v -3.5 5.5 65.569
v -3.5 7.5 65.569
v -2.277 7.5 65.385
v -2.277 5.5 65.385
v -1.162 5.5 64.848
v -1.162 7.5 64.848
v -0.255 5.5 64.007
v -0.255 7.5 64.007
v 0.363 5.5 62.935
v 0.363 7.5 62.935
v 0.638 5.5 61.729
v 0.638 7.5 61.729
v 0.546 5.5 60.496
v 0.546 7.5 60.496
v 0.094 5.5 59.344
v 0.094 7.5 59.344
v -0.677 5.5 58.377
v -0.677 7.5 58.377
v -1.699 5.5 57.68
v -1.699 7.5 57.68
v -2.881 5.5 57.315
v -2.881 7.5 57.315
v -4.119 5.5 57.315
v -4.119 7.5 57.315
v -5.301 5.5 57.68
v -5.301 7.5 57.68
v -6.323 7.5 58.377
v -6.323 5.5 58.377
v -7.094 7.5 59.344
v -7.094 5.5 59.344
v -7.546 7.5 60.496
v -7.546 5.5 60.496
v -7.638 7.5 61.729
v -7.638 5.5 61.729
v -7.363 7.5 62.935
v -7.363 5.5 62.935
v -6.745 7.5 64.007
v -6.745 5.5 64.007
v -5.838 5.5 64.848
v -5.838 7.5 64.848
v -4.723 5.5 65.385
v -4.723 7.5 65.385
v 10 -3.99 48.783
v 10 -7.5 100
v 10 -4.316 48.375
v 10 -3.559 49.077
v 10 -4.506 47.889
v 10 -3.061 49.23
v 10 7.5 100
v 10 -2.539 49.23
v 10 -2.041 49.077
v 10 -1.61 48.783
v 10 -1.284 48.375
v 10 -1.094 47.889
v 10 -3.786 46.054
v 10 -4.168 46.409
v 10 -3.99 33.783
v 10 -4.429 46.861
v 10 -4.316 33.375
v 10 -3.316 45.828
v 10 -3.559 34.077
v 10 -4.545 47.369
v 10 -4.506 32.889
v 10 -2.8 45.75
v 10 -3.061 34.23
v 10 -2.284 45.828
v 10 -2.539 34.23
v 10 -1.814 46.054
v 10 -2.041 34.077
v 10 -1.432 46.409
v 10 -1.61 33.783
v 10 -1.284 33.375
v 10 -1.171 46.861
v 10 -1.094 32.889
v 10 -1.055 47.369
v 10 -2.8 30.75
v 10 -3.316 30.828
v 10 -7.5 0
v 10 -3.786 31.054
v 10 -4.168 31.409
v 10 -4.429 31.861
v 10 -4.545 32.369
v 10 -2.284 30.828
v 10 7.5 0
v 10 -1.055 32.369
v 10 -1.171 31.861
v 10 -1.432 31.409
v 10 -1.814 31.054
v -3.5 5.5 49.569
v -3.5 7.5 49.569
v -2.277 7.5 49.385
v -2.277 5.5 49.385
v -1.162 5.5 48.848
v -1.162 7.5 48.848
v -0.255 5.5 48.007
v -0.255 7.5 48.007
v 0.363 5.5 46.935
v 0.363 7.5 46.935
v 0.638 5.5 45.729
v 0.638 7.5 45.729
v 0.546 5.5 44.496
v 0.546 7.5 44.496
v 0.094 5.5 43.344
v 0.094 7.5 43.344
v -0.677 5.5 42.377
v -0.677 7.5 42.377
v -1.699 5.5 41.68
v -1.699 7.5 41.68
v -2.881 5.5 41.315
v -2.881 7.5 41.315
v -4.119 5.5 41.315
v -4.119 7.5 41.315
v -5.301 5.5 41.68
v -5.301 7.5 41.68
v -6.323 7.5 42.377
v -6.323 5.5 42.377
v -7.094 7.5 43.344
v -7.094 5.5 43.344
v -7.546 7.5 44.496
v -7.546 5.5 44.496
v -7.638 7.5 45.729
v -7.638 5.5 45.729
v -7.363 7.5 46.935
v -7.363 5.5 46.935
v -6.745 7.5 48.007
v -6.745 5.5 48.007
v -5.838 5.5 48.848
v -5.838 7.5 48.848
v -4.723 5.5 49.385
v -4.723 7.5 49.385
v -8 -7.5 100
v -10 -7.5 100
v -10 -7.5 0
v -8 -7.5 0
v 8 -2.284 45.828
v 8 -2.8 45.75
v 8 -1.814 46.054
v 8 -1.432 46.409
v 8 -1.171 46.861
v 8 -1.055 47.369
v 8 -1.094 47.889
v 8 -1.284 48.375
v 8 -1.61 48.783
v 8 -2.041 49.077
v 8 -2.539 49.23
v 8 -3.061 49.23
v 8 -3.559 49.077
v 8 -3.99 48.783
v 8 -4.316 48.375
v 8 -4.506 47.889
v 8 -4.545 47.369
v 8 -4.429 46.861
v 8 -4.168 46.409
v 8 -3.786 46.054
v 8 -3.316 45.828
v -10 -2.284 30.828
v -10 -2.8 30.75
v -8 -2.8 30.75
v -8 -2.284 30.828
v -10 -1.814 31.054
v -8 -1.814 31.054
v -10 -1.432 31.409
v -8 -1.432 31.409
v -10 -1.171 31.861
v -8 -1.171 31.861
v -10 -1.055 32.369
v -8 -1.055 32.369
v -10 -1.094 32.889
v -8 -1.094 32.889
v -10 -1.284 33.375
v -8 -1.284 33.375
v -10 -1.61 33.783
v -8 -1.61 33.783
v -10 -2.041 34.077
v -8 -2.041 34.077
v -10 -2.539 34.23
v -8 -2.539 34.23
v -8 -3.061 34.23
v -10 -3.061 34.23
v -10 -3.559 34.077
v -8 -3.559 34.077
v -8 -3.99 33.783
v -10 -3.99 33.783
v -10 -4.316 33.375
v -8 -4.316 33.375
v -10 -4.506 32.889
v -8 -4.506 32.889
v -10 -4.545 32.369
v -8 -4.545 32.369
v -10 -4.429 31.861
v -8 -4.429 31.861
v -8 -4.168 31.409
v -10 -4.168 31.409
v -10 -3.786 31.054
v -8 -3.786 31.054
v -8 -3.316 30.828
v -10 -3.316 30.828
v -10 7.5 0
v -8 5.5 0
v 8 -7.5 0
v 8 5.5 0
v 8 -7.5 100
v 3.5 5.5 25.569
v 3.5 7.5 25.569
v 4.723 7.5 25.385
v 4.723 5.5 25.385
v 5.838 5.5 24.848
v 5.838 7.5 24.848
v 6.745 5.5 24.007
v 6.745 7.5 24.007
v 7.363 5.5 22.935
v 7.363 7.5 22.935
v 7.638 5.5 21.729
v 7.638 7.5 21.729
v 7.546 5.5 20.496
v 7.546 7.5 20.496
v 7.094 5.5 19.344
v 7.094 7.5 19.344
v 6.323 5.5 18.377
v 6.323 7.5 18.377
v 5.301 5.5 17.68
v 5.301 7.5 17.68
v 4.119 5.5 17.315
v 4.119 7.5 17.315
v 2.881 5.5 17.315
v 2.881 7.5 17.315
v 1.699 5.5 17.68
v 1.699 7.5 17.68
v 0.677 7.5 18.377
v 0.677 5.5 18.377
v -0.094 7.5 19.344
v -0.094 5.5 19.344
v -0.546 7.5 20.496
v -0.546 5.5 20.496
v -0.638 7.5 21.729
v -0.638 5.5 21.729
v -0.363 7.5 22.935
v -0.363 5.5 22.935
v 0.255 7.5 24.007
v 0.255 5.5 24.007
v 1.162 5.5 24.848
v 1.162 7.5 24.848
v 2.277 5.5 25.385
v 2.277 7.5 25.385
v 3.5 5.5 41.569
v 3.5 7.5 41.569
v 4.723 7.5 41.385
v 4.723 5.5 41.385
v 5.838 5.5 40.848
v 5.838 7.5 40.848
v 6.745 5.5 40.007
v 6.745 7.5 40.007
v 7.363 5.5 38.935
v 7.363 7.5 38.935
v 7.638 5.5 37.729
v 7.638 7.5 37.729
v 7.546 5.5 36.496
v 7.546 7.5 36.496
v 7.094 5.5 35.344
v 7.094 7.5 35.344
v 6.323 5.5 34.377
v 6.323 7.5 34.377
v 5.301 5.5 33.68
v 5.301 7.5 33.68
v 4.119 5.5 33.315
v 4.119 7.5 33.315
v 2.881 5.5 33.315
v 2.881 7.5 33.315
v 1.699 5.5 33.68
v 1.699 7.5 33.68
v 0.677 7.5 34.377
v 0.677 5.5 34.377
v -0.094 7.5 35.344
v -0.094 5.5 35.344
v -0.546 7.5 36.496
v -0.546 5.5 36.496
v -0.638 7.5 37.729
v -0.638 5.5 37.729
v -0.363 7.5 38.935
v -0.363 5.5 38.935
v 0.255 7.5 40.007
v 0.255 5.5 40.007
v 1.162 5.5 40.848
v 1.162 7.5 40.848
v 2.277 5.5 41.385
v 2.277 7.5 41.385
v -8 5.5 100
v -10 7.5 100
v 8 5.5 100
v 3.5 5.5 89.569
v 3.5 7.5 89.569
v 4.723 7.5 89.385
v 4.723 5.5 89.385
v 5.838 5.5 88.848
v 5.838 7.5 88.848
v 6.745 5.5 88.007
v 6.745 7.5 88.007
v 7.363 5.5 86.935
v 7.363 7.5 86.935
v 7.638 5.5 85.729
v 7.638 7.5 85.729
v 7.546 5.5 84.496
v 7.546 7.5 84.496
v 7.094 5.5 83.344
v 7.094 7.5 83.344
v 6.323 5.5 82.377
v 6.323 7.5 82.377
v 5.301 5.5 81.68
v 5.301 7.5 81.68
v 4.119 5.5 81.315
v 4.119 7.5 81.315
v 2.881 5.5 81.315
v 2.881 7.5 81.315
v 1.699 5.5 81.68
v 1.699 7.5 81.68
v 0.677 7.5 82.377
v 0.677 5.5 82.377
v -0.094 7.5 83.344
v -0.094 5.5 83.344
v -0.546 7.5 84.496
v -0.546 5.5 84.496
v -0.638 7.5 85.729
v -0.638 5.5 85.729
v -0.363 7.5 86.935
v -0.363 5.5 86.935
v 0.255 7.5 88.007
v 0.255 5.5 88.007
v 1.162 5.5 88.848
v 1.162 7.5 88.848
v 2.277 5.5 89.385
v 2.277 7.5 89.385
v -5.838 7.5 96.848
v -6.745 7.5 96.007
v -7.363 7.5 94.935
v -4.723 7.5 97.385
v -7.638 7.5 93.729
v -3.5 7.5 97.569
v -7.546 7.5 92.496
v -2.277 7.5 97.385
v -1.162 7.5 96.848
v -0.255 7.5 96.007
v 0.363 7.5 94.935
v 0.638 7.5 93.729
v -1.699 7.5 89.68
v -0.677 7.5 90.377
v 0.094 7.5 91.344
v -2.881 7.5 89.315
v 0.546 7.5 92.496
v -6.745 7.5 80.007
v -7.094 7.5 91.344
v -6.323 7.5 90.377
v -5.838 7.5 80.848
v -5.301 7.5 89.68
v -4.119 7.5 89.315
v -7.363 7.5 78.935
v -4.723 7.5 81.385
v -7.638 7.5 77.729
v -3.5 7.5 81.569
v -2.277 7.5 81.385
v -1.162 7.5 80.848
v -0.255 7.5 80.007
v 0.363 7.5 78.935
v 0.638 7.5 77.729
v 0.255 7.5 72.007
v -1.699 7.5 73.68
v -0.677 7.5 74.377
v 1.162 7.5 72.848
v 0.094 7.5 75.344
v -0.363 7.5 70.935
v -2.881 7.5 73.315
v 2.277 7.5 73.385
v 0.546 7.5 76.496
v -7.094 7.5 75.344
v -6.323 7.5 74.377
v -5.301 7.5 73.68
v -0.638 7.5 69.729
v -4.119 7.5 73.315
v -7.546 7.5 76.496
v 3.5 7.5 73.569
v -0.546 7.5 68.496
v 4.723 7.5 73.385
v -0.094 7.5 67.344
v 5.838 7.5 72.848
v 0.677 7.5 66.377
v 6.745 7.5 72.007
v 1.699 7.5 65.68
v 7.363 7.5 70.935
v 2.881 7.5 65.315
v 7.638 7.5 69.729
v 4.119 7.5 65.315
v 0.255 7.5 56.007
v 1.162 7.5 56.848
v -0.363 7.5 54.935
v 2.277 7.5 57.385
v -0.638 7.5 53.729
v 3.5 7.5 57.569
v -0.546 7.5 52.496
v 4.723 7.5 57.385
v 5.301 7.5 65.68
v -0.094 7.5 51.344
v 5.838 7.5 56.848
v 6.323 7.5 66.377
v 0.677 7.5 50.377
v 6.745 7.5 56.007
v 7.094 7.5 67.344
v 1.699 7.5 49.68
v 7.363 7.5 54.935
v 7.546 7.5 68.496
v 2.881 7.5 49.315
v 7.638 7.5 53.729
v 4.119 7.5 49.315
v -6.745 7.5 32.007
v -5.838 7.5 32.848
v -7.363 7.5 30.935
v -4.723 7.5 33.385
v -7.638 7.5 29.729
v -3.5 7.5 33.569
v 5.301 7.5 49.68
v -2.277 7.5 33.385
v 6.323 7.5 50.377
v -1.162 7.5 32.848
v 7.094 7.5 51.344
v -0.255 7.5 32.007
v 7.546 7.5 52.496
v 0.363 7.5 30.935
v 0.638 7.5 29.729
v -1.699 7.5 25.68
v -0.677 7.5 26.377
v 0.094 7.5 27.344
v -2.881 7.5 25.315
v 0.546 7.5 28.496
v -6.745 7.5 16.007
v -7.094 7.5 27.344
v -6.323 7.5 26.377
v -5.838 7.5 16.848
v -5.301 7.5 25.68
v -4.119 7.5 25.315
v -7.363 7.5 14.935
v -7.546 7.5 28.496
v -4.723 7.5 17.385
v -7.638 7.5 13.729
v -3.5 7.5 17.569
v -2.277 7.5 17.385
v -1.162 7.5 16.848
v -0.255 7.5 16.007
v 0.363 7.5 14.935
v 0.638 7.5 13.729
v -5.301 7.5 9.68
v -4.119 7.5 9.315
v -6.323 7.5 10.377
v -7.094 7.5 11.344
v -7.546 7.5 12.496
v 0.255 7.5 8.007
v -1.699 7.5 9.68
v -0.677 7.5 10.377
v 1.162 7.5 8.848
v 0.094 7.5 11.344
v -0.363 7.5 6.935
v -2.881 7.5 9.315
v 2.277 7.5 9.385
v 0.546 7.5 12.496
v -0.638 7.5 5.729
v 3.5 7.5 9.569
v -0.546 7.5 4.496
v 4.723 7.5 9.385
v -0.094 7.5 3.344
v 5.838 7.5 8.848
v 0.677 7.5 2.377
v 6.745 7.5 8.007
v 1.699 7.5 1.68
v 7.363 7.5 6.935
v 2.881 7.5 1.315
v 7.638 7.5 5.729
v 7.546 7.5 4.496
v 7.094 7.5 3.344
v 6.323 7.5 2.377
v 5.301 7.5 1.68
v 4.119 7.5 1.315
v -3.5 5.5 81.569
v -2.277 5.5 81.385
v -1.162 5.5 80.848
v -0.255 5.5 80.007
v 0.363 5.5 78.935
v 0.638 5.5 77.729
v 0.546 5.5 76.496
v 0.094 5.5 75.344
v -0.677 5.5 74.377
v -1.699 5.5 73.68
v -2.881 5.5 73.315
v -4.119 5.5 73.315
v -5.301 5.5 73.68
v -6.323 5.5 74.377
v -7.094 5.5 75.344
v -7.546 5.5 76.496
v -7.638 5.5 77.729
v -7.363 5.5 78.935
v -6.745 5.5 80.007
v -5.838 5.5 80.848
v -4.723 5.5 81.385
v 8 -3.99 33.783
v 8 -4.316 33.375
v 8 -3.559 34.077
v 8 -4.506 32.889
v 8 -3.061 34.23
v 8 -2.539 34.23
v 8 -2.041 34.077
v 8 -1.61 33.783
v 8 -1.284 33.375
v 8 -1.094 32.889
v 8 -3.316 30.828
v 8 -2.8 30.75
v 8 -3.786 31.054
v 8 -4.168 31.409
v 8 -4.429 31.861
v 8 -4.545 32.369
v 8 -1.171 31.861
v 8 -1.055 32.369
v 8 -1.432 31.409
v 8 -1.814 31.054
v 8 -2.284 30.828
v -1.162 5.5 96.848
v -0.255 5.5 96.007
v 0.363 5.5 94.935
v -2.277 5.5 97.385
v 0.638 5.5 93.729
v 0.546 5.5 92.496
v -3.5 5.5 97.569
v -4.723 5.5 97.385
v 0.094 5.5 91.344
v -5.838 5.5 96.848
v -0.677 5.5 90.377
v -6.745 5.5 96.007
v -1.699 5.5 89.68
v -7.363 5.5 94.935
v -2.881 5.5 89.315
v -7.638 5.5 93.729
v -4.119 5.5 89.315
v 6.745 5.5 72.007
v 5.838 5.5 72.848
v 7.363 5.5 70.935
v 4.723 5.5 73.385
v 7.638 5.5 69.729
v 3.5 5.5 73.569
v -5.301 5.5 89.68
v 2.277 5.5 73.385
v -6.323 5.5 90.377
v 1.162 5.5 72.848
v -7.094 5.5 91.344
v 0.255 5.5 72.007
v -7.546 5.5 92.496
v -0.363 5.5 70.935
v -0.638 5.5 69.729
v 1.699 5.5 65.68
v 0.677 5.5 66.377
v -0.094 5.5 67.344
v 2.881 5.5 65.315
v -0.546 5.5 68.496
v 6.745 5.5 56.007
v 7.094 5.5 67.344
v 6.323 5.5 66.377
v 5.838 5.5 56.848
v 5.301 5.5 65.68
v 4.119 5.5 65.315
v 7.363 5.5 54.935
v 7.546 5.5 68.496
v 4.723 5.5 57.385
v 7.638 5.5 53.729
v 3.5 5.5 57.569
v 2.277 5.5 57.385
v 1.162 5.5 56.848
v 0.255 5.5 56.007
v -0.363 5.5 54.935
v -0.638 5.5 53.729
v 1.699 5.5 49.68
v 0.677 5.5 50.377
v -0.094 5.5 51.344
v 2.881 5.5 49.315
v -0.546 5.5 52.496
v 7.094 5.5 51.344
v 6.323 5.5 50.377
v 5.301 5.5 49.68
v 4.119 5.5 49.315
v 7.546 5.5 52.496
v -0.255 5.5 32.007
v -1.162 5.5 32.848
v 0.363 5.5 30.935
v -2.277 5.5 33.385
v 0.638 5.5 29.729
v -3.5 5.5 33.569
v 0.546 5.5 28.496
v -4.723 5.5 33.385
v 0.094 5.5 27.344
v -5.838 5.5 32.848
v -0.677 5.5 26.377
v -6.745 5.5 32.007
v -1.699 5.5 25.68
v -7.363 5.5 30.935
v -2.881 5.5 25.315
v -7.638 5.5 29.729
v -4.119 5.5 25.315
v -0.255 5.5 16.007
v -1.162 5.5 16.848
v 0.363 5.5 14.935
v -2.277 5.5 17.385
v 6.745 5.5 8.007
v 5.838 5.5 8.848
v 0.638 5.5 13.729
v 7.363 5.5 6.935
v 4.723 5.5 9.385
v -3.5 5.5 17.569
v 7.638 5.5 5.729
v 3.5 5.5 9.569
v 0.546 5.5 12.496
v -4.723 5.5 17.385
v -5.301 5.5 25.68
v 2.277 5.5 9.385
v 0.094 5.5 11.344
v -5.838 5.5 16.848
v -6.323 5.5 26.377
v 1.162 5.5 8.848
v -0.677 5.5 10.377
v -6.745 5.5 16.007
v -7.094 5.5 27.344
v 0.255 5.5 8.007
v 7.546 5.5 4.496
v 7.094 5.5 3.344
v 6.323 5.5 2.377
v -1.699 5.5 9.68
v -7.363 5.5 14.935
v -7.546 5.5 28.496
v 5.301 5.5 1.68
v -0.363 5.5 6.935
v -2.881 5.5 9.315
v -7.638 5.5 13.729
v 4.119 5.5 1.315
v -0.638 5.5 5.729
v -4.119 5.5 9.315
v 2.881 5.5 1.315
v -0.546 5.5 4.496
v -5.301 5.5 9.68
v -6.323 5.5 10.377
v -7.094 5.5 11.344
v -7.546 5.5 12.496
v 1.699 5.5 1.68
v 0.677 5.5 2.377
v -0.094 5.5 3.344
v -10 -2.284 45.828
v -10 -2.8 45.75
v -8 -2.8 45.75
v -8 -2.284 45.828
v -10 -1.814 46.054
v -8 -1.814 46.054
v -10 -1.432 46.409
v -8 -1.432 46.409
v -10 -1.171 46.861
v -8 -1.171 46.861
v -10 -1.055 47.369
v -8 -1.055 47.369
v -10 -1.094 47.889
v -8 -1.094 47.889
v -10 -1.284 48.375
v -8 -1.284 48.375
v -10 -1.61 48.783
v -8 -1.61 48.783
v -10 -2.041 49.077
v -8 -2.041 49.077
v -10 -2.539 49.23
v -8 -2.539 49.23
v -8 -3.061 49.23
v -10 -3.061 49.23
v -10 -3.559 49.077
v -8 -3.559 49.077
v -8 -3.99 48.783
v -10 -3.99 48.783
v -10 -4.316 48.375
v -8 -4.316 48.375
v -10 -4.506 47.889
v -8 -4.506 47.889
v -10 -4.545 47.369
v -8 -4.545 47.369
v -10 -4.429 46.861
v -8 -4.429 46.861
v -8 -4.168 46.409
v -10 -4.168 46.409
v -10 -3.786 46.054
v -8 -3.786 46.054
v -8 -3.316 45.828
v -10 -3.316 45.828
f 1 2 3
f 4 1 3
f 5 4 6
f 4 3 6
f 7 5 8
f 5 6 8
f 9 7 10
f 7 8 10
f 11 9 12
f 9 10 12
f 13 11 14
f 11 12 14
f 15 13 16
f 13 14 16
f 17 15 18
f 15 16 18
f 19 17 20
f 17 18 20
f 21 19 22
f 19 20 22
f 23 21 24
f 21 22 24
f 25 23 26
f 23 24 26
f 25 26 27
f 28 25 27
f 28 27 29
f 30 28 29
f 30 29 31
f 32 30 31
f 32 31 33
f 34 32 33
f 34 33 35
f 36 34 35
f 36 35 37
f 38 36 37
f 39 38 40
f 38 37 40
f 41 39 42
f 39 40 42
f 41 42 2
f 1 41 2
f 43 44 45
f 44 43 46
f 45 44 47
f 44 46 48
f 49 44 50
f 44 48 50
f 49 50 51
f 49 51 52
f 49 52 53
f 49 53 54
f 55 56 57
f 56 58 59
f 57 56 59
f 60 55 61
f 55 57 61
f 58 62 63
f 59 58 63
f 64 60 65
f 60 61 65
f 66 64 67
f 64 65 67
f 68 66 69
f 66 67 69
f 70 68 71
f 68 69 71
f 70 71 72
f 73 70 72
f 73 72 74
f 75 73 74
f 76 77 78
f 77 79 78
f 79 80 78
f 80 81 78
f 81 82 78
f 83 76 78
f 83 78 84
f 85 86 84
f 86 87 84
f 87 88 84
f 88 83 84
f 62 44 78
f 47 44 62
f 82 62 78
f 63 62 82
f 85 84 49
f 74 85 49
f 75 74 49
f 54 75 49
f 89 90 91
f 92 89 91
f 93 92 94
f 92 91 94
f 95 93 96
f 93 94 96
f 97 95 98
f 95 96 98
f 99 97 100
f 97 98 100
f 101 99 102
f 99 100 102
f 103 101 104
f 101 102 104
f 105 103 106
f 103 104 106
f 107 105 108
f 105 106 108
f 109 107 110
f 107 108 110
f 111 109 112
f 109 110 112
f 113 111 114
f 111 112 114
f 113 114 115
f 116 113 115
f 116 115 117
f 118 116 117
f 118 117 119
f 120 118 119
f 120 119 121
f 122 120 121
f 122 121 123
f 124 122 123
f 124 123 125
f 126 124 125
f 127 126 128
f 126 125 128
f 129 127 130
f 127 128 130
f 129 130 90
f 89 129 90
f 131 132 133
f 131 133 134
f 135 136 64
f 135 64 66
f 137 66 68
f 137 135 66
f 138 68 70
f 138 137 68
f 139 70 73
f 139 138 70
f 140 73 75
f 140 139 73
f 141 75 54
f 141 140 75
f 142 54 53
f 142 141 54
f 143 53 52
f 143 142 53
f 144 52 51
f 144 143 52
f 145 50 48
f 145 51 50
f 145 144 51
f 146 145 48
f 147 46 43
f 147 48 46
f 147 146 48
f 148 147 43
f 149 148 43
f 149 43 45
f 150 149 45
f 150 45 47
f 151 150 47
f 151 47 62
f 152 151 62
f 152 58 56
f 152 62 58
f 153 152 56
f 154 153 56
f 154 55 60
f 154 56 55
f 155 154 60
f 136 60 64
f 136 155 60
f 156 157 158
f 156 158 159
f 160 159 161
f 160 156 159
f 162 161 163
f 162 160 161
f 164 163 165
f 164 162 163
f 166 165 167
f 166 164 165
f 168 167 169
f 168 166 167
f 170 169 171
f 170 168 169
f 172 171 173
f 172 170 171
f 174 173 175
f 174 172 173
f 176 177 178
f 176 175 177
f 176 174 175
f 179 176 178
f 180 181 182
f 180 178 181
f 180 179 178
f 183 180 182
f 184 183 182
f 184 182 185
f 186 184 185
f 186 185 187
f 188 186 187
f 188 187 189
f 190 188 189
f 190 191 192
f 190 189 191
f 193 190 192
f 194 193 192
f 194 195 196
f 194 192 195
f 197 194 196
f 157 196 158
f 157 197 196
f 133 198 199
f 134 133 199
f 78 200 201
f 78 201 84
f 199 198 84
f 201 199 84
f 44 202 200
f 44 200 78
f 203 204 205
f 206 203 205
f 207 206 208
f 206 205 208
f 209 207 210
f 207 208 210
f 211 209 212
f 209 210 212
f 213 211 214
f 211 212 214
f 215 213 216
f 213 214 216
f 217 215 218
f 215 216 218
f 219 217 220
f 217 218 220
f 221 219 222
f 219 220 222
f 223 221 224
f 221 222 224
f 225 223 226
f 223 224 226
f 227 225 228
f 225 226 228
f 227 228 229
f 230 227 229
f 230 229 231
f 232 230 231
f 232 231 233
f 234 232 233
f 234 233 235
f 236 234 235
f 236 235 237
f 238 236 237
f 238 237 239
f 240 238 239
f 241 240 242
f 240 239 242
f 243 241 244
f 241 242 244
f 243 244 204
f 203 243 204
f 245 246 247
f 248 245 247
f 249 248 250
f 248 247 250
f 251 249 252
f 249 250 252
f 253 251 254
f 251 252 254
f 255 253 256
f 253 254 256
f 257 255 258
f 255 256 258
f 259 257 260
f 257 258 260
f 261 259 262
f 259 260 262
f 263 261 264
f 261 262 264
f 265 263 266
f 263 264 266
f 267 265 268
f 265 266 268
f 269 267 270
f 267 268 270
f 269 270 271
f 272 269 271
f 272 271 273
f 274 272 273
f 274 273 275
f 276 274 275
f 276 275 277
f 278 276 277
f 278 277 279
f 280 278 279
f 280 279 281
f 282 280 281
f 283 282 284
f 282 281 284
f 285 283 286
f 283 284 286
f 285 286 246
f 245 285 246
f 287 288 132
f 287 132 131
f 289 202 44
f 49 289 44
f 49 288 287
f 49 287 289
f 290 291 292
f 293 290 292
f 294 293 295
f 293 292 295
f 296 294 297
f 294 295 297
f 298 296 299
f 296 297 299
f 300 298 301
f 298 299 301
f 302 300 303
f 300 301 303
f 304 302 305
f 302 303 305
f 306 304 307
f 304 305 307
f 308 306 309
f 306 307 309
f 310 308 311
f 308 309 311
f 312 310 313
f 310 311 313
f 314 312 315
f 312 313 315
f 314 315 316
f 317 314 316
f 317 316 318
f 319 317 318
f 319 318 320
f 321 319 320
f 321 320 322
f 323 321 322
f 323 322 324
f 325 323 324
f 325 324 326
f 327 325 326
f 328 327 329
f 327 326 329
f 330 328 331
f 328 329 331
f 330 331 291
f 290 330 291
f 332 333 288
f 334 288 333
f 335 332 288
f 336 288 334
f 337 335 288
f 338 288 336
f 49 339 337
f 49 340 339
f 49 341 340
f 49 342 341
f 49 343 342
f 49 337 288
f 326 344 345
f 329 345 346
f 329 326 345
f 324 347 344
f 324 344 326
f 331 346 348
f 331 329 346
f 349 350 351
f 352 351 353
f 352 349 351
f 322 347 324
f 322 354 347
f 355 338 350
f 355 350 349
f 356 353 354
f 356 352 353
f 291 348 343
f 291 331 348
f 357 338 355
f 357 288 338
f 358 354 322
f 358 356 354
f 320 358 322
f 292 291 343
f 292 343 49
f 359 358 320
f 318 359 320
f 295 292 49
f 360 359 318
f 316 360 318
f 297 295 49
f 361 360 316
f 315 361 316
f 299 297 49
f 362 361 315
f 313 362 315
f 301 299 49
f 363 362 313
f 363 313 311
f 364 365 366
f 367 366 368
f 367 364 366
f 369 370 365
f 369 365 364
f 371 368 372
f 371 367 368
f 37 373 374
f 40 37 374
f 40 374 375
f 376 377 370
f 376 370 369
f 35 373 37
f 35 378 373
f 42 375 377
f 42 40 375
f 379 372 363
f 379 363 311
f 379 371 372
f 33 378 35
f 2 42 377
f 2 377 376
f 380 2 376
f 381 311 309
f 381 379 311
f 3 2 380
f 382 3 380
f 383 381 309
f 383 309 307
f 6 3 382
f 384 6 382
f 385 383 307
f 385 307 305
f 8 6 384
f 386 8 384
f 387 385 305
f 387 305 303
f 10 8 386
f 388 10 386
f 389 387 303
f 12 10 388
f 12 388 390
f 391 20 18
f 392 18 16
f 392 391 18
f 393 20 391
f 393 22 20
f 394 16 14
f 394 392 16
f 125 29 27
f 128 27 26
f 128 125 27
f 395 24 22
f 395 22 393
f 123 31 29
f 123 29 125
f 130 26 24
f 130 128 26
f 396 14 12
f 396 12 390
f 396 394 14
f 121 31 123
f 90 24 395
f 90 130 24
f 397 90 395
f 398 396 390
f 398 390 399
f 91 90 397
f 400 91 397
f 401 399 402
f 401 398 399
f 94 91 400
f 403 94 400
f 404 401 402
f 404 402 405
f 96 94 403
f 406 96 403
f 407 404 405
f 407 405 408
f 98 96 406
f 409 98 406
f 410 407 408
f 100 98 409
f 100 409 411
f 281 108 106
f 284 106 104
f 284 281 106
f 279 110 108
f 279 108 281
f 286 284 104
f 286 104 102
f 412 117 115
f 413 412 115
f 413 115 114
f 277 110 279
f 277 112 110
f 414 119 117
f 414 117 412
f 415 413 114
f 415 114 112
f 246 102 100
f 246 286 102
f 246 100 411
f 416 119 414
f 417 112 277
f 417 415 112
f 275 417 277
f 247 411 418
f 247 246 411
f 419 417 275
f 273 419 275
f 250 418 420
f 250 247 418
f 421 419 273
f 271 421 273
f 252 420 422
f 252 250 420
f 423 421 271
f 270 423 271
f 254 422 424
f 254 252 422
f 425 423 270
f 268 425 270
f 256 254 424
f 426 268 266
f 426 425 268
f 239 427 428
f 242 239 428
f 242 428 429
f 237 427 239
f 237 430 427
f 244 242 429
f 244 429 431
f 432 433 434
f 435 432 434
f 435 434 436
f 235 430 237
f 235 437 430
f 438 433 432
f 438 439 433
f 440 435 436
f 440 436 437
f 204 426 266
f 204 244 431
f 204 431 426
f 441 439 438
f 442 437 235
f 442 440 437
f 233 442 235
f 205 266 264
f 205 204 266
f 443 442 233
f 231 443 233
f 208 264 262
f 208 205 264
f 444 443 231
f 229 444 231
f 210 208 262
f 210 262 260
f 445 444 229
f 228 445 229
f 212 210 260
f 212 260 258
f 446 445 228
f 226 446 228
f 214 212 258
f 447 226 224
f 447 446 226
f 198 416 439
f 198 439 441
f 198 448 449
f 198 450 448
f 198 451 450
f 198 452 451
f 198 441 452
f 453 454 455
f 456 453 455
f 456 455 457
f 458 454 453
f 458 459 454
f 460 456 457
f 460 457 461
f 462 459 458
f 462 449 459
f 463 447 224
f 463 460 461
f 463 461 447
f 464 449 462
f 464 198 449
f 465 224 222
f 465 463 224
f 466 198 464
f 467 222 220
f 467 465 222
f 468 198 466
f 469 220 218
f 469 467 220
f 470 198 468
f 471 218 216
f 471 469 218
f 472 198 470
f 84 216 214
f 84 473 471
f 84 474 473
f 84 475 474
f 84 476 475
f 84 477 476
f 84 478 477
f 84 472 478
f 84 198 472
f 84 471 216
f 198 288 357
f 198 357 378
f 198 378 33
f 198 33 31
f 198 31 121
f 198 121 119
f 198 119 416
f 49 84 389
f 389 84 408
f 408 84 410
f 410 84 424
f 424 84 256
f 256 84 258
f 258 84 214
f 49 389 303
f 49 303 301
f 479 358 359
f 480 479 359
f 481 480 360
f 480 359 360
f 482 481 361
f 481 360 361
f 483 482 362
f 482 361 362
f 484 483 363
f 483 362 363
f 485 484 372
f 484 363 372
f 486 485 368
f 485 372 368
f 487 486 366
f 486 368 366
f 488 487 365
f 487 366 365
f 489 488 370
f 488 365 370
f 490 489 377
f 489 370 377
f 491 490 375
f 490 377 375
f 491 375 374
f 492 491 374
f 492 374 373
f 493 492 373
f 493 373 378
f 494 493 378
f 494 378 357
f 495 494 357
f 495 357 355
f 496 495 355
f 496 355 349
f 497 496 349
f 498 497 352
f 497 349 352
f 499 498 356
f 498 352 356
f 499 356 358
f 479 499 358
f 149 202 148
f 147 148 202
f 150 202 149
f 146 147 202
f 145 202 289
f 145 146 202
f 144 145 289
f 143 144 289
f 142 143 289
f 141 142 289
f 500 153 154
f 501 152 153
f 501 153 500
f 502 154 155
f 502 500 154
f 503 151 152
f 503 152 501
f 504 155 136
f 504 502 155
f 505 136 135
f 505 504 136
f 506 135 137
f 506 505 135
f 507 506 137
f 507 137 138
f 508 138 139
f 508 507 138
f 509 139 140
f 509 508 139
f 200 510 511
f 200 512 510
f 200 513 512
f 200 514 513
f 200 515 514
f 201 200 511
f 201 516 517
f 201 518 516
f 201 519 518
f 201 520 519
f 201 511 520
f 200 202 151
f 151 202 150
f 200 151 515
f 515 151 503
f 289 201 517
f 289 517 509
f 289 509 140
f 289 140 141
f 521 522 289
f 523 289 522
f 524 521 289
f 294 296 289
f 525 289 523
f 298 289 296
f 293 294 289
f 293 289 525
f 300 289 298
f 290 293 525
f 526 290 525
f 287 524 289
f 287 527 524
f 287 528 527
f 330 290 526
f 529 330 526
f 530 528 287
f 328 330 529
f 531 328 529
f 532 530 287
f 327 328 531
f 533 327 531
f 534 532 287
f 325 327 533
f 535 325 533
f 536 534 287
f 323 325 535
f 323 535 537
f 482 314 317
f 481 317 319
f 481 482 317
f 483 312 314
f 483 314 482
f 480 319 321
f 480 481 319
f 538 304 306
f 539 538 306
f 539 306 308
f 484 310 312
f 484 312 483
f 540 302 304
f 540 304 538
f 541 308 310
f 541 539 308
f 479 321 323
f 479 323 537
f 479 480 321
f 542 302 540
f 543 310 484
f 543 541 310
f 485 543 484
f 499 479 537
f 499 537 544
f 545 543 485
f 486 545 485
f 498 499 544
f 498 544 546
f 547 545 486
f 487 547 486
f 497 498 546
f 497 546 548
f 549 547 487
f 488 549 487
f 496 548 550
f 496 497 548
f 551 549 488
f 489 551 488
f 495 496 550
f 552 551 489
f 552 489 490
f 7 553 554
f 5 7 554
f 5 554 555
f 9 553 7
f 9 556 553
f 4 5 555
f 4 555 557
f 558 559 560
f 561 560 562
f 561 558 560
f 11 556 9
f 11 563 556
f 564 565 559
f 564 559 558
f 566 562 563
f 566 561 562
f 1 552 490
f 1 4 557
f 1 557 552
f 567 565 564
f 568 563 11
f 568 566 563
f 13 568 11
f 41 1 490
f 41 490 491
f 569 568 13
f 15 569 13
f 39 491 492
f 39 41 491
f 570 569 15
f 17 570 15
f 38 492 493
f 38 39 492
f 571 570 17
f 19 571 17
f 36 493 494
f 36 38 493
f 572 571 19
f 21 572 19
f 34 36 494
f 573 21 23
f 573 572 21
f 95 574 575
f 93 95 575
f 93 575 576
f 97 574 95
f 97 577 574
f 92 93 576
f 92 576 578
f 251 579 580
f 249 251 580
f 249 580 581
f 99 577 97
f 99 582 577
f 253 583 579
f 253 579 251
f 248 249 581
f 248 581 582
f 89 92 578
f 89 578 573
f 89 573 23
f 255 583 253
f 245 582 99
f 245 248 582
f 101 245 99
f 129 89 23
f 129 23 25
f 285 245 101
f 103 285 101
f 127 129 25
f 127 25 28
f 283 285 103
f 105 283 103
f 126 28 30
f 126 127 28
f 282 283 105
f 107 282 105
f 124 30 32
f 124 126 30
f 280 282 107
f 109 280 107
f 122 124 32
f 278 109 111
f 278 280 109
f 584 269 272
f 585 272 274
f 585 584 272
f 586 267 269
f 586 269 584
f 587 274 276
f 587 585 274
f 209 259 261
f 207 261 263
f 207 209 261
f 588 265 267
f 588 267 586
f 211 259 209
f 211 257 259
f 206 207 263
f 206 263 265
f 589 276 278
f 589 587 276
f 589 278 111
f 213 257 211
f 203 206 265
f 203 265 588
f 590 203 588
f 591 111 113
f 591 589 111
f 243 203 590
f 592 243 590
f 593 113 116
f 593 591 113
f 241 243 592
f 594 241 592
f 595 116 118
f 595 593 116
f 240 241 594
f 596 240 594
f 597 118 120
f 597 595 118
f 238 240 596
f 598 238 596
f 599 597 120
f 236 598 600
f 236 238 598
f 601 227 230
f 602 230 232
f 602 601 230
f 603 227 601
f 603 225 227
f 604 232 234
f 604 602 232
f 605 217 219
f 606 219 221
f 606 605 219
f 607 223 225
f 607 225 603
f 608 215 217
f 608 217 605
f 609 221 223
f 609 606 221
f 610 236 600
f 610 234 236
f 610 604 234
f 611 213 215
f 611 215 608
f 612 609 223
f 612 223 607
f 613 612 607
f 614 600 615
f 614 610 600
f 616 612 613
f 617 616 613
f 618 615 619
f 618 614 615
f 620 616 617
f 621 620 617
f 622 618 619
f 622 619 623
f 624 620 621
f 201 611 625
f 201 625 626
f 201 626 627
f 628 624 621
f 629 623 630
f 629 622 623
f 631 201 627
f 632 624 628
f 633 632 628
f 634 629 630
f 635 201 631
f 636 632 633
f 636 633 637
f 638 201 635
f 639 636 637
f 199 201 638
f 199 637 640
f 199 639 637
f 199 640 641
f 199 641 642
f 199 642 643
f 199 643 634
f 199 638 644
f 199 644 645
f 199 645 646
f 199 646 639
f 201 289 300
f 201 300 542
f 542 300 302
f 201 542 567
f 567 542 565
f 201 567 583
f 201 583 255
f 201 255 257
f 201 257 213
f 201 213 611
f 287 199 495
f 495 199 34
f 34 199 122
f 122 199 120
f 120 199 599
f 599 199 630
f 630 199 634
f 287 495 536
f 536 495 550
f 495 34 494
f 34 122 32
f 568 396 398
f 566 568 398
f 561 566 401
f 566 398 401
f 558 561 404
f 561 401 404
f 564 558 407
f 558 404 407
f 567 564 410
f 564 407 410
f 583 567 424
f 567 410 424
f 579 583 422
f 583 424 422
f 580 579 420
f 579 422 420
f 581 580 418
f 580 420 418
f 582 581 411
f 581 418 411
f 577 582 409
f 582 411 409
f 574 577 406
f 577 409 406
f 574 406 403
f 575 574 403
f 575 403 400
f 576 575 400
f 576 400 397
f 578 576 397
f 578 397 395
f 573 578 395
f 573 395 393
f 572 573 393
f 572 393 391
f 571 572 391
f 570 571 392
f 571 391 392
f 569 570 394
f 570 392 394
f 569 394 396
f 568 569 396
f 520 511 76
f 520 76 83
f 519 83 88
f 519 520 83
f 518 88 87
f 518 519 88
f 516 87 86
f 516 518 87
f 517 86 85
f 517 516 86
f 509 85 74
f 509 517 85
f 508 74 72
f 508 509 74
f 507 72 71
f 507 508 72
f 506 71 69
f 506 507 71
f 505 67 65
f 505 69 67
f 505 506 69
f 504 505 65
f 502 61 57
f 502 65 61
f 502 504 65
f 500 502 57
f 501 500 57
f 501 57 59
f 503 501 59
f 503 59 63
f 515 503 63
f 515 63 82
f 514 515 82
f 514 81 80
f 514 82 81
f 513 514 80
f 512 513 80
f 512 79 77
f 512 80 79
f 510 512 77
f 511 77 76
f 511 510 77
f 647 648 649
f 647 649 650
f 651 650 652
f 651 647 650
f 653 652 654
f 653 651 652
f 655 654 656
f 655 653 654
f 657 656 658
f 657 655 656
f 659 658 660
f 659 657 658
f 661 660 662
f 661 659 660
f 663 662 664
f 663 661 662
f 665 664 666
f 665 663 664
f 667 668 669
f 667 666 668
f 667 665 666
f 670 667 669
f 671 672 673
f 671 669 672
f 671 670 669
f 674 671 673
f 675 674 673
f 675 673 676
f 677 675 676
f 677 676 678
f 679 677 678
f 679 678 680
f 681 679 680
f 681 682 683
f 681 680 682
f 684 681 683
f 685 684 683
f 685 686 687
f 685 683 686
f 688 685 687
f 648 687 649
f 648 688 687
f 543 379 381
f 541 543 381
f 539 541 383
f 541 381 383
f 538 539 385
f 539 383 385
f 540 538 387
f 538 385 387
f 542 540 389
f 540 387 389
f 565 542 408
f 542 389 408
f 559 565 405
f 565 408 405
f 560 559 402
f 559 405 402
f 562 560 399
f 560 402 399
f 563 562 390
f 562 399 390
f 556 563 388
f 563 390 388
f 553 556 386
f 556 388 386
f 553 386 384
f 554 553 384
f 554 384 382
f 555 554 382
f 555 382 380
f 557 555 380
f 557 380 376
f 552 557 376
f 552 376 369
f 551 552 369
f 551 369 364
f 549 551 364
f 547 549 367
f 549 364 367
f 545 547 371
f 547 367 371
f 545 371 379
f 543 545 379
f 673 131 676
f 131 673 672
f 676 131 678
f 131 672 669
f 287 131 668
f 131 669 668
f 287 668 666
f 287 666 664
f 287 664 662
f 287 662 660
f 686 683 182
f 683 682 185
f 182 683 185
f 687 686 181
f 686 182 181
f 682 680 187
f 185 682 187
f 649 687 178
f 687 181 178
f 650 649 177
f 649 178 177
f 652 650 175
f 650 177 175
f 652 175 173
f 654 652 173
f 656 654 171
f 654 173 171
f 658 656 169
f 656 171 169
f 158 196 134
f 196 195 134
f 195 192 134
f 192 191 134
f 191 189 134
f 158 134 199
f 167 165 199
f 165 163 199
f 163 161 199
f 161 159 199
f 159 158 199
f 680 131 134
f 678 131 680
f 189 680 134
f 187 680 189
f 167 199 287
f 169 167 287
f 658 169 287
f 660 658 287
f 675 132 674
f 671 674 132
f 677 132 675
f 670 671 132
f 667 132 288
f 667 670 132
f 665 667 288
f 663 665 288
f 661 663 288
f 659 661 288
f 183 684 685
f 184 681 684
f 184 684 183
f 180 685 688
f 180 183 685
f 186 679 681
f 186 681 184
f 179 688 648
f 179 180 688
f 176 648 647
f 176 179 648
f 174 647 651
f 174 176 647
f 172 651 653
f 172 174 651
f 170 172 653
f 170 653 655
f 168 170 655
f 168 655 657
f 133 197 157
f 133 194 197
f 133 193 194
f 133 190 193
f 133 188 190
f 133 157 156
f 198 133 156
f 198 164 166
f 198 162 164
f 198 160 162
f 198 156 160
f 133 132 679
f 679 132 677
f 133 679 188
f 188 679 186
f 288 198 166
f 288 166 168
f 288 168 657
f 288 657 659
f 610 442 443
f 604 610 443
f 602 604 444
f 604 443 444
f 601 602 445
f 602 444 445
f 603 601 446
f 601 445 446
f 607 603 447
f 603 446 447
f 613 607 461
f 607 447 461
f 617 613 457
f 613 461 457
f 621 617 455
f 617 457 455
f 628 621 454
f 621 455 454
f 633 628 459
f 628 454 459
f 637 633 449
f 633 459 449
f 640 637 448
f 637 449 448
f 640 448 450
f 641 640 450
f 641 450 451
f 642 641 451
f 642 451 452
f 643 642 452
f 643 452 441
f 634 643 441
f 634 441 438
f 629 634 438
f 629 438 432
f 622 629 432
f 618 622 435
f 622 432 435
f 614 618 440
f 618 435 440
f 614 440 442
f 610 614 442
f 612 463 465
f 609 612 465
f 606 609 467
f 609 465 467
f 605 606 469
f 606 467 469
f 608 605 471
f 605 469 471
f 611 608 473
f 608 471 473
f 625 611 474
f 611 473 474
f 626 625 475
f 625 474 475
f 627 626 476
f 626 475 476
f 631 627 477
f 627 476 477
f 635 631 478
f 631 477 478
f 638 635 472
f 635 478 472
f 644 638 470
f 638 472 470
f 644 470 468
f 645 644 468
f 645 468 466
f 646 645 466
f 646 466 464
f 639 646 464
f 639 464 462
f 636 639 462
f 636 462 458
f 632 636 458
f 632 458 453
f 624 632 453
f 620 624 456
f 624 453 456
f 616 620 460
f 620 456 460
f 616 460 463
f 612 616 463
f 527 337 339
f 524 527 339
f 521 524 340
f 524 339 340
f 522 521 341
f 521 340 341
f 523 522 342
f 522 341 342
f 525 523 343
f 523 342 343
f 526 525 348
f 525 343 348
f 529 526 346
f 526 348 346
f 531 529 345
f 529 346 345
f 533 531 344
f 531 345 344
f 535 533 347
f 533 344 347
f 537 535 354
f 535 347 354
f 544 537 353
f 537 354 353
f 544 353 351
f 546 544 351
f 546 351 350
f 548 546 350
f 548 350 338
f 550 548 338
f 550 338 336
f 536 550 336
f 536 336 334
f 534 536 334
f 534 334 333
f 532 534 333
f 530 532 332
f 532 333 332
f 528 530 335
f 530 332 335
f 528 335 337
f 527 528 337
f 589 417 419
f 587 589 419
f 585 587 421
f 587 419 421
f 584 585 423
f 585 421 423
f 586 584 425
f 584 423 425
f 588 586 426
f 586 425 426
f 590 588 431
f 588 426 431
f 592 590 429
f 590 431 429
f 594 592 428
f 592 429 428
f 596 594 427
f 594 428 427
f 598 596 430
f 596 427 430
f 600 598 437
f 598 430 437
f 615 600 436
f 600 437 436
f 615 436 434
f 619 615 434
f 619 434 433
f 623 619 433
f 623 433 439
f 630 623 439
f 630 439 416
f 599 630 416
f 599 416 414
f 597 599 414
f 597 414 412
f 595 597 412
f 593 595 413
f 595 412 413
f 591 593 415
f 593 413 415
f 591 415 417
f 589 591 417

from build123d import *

# Parameters (mm, degrees)
CROQUIS1_W                 = 20
CROQUIS1_H                 = 15
SALIENTE_EXTRUIR1_DEPTH    = 100
CROQUIS2_W                 = 16
CROQUIS2_H                 = 13
CORTAR_EXTRUIR2_DEPTH      = 100
CROQUIS3_R                 = 4.15
CORTAR_EXTRUIR3_DEPTH      = 2
CORTAR_EXTRUIR5_DEPTH      = 103.255806681
CORTAR_EXTRUIR5_DEPTH_BACK = 103.255806681
CROQUIS4_R                 = 1.75


with BuildPart() as part:
    # Croquis1 → Saliente-Extruir1 (new body)
    with BuildSketch(Plane.XY):
        Rectangle(CROQUIS1_W, CROQUIS1_H)
    extrude(amount=SALIENTE_EXTRUIR1_DEPTH)

    # Croquis2 → Cortar-Extruir2 (cut)
    with BuildSketch(Plane(origin=(0, 0, 0), x_dir=(-1, 0, 0), z_dir=(0, 0, -1))):
        with Locations((0, -1)):
            Rectangle(CROQUIS2_W, CROQUIS2_H)
    extrude(amount=-CORTAR_EXTRUIR2_DEPTH, mode=Mode.SUBTRACT)

    # Croquis3 → Cortar-Extruir3 (cut)
    with BuildSketch(Plane(origin=(0, 7.5, 0), x_dir=(1, 0, 0), z_dir=(0, 1, 0))):
        with Locations(Location((3.5, -5.419128069, 0), (0, 0, 270))):
            Circle(CROQUIS3_R)
        with Locations(Location((-3.5, -13.419128069, 0), (0, 0, 270))):
            Circle(CROQUIS3_R)
        with Locations(Location((3.5, -21.419128069, 0), (0, 0, 270))):
            Circle(CROQUIS3_R)
        with Locations(Location((-3.5, -29.419128069, 0), (0, 0, 270))):
            Circle(CROQUIS3_R)
        with Locations(Location((3.5, -37.419128069, 0), (0, 0, 270))):
            Circle(CROQUIS3_R)
        with Locations(Location((-3.5, -45.419128069, 0), (0, 0, 270))):
            Circle(CROQUIS3_R)
        with Locations(Location((3.5, -53.419128069, 0), (0, 0, 270))):
            Circle(CROQUIS3_R)
        with Locations(Location((-3.5, -61.419128069, 0), (0, 0, 270))):
            Circle(CROQUIS3_R)
        with Locations(Location((3.5, -69.419128069, 0), (0, 0, 270))):
            Circle(CROQUIS3_R)
        with Locations(Location((-3.5, -77.419128069, 0), (0, 0, 270))):
            Circle(CROQUIS3_R)
        with Locations(Location((3.5, -85.419128069, 0), (0, 0, 270))):
            Circle(CROQUIS3_R)
        with Locations(Location((-3.5, -93.419128069, 0), (0, 0, 270))):
            Circle(CROQUIS3_R)
    extrude(amount=-CORTAR_EXTRUIR3_DEPTH, mode=Mode.SUBTRACT)

    # Croquis4 → Cortar-Extruir5 (cut, two sides: drawn at the far end of the back side and taken through both)
    with BuildSketch(Plane(origin=(10, 0, 0), x_dir=(0, 0, -1), z_dir=(1, 0, 0)).offset(-CORTAR_EXTRUIR5_DEPTH_BACK)):
        with Locations((-32.5, -2.8)):
            Circle(CROQUIS4_R)
        with Locations((-47.5, -2.8)):
            Circle(CROQUIS4_R)
    extrude(amount=CORTAR_EXTRUIR5_DEPTH + CORTAR_EXTRUIR5_DEPTH_BACK, mode=Mode.SUBTRACT)


solid = part.part
